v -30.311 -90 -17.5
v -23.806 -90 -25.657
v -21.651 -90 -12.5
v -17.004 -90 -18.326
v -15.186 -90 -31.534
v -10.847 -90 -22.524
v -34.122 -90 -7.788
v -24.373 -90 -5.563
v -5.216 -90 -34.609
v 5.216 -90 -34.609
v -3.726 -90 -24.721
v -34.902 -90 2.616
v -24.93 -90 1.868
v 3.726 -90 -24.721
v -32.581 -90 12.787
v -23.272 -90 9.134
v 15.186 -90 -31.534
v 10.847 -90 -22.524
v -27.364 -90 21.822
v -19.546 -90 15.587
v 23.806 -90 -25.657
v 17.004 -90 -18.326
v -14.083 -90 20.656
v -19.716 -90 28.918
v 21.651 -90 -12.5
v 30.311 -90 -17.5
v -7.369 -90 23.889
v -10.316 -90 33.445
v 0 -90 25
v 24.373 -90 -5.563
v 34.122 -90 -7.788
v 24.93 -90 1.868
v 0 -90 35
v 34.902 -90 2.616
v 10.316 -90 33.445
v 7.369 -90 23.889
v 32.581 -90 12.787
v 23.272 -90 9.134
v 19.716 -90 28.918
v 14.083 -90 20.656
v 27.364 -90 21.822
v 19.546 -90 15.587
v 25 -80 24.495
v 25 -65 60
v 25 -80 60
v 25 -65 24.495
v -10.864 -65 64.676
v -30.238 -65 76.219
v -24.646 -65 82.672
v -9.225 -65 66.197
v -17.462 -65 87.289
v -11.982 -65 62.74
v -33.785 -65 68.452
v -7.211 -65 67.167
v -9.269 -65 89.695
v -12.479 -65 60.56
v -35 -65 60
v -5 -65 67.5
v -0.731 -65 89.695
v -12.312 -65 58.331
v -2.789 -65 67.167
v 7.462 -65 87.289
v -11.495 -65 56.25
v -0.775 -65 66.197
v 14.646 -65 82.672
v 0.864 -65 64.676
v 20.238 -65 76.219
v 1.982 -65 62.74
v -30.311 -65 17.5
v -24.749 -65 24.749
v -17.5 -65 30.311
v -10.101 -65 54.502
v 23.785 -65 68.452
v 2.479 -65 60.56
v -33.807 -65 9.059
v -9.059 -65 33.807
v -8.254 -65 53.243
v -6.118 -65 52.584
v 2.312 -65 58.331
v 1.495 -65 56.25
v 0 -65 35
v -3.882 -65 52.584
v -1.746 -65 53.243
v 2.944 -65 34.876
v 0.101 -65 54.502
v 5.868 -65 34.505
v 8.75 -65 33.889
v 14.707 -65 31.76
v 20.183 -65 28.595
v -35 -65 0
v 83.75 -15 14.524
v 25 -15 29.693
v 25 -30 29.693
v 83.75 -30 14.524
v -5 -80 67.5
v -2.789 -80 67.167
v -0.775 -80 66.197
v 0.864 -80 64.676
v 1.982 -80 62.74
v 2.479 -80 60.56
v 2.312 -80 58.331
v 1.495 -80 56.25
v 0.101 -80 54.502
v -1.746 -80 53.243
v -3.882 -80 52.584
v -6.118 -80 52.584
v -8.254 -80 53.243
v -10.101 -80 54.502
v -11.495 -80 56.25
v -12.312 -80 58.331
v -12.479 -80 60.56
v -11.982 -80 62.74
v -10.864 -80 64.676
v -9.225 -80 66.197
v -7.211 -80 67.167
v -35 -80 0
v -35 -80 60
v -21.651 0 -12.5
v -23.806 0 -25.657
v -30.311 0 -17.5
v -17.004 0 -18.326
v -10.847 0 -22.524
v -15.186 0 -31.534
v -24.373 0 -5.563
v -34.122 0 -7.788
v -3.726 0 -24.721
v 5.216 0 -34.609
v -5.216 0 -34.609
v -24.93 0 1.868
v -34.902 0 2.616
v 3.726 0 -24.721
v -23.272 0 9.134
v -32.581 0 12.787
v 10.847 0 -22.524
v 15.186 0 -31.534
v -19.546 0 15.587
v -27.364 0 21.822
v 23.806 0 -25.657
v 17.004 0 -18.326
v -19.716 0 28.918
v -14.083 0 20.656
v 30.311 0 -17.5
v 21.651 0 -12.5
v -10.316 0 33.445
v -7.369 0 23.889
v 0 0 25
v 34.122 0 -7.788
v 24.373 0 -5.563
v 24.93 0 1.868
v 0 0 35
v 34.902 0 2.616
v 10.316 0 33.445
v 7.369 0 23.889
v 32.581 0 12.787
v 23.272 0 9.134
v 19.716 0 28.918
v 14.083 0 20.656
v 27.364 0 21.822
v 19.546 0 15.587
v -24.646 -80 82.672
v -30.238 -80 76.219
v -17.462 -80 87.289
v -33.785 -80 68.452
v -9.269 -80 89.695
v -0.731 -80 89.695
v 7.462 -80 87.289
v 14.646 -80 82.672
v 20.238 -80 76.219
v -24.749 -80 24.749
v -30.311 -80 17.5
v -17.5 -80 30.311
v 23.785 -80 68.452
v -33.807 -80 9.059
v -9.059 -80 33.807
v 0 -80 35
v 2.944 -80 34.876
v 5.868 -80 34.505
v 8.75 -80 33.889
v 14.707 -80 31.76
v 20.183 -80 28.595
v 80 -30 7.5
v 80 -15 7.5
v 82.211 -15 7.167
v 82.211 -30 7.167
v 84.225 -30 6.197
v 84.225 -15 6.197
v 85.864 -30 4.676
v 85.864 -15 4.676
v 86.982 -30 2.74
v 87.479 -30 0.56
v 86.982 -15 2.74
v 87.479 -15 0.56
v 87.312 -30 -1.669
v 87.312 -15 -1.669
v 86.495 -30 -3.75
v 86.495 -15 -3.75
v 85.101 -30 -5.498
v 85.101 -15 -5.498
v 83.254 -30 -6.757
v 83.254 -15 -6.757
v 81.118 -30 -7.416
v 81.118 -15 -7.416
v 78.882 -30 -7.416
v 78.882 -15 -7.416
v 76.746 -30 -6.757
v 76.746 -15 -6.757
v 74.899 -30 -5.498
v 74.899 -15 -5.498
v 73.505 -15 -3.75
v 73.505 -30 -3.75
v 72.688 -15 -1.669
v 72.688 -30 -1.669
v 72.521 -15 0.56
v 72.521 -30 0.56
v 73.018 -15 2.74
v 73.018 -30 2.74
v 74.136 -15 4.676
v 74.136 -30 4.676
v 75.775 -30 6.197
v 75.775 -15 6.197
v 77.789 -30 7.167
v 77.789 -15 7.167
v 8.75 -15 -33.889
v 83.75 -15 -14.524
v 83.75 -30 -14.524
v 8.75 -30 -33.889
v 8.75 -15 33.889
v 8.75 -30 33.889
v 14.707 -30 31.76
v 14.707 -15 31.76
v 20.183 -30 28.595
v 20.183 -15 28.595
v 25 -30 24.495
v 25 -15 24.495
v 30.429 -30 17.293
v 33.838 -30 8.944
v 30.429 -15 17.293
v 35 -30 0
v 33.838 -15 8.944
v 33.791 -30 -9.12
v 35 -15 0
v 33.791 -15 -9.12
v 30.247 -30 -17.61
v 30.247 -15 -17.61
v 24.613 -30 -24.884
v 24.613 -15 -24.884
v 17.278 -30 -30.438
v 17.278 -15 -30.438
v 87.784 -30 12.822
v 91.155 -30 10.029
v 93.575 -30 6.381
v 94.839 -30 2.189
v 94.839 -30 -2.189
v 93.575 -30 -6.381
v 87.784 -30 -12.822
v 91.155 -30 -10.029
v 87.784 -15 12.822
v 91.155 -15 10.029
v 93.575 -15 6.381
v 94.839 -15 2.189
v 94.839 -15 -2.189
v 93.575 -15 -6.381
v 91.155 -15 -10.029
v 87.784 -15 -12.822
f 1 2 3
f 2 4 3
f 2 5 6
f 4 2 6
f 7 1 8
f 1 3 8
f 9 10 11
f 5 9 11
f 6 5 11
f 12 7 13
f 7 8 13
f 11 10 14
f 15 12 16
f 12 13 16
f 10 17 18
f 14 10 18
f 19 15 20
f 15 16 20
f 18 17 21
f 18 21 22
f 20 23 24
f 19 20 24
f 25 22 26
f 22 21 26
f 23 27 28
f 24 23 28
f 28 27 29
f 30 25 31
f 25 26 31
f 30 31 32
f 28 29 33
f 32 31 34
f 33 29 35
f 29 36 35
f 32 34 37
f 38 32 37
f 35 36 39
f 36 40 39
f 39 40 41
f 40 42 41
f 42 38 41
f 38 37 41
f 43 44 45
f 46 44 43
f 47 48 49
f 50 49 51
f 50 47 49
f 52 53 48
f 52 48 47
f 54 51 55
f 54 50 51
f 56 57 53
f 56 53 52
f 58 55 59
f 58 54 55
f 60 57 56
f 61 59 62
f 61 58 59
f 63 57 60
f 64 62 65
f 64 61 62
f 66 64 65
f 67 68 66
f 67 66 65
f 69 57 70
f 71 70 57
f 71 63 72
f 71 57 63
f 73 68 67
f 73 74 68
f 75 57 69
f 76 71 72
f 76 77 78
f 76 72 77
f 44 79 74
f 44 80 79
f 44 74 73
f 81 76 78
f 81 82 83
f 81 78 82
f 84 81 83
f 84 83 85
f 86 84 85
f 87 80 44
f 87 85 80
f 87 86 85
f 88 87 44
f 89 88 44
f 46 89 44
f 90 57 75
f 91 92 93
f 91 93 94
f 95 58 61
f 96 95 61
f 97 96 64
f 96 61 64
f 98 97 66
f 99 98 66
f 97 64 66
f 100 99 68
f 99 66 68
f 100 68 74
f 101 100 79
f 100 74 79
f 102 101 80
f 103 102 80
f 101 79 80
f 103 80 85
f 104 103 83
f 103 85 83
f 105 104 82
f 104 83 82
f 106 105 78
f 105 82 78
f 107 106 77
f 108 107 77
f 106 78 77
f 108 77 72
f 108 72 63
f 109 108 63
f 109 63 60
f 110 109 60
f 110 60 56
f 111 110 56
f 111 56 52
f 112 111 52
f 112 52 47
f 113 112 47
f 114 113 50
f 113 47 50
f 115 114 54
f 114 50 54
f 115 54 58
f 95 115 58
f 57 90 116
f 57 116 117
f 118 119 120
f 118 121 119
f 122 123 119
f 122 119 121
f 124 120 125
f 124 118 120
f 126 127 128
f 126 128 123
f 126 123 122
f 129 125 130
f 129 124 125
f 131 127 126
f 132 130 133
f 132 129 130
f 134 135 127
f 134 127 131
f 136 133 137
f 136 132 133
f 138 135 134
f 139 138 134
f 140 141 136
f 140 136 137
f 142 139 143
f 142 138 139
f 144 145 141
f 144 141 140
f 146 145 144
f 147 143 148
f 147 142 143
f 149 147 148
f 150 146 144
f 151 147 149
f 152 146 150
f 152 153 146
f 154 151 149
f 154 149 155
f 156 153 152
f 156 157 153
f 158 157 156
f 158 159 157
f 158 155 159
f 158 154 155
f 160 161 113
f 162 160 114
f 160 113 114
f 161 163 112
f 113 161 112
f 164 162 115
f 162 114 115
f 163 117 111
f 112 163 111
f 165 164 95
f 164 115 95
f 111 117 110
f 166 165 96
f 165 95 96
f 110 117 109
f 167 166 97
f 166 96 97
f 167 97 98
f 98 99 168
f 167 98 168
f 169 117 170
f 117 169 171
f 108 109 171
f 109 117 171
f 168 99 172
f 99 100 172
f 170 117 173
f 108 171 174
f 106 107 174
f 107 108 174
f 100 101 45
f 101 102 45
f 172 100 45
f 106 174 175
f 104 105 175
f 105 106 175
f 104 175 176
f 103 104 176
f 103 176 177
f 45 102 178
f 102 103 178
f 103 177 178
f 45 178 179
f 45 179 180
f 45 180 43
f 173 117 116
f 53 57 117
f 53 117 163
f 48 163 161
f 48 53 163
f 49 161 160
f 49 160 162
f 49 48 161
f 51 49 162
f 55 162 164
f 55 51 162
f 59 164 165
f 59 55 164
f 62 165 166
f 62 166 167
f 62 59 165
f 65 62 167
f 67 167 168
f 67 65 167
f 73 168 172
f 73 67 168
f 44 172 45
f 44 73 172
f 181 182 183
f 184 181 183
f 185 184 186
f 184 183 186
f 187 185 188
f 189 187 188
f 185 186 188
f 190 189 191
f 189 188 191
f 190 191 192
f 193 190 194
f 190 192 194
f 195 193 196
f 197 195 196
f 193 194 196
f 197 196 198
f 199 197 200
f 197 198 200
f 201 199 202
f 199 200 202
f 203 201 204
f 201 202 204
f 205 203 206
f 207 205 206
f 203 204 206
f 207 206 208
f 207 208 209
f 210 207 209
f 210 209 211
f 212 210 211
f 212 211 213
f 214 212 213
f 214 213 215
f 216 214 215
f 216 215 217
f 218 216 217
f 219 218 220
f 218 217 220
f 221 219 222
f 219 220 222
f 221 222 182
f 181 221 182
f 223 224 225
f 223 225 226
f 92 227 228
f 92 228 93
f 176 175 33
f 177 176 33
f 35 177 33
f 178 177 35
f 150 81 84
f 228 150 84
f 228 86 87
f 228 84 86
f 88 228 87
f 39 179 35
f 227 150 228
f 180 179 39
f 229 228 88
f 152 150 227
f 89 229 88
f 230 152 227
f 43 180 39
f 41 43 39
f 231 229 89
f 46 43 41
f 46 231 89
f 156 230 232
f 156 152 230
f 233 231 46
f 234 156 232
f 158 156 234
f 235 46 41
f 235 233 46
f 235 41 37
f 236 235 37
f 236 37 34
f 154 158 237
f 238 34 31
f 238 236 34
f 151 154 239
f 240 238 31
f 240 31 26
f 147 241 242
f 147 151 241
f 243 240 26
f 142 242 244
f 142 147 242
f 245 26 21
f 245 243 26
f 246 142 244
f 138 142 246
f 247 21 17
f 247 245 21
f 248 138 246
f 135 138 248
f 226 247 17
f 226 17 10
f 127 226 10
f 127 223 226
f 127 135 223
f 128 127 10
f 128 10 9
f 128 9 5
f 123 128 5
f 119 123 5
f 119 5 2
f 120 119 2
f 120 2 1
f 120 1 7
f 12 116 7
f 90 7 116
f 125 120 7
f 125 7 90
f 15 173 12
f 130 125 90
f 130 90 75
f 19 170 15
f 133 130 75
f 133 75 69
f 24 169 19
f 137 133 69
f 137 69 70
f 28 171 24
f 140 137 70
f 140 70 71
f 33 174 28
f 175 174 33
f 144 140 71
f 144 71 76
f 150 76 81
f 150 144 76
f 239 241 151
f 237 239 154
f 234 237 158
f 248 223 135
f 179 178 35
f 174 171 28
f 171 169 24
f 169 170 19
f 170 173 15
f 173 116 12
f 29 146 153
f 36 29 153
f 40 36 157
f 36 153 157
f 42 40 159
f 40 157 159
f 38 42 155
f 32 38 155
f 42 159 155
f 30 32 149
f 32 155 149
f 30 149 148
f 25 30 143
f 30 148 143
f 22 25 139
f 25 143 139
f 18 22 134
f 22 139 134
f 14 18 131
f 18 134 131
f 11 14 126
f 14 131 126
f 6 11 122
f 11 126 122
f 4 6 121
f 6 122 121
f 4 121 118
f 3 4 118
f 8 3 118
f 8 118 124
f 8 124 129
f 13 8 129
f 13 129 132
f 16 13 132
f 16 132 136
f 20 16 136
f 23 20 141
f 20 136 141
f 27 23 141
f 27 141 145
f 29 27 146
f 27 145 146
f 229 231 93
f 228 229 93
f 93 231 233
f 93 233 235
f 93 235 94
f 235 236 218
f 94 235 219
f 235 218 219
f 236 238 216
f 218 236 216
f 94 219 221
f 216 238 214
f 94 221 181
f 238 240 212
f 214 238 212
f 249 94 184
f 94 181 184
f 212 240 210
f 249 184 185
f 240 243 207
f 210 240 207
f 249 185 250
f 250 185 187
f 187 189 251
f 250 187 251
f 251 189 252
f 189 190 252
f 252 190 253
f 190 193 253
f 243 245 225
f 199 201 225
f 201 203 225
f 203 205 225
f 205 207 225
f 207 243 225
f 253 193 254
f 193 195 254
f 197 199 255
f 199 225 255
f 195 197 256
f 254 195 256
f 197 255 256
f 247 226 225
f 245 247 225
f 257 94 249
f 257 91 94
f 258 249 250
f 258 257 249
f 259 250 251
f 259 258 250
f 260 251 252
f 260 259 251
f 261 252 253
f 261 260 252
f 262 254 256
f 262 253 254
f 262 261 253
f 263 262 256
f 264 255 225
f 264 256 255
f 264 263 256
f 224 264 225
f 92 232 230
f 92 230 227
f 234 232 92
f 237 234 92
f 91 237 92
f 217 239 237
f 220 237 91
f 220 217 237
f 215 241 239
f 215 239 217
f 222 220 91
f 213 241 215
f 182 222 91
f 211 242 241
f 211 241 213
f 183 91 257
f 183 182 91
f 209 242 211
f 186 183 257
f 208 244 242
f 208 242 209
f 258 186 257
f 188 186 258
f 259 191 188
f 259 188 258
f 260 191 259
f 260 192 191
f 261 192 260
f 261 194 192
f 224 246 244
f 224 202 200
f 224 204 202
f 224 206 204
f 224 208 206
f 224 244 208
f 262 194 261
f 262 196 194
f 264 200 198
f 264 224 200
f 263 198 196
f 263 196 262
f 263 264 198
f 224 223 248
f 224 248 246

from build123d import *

# Parameters (mm, degrees)
SKETCH1_R           = 25
BOSS_EXTRUDE1_DEPTH = 90
BOSS_EXTRUDE2_START = -65
SKETCH1_3_R         = 7.5
BOSS_EXTRUDE2_DEPTH = 15
BOSS_EXTRUDE3_START = -15
SKETCH1_4_R         = 7.5
BOSS_EXTRUDE3_DEPTH = 15


with BuildPart() as part:
    # Sketch1 → Boss-Extrude1 (new body)
    with BuildSketch(Plane(origin=(0, 0, 0), x_dir=(1, 0, 0), z_dir=(0, 1, 0))):
        with BuildLine():
            ThreePointArc((35, 0), (27.669929526, 21.433035249), (8.75, 33.888604279))
            ThreePointArc((8.75, 33.888604279), (-21.433035249, 27.669929526), (-35, 0))
            ThreePointArc((-35, 0), (-21.433035249, -27.669929526), (8.75, -33.888604279))
            ThreePointArc((8.75, -33.888604279), (17.516451042, -30.301385165), (25, -24.494897428))
            ThreePointArc((25, -24.494897428), (32.403703492, -13.228756555), (35, 0))
        make_face()
        Circle(SKETCH1_R, mode=Mode.SUBTRACT)
    extrude(amount=-BOSS_EXTRUDE1_DEPTH)

    # Sketch1<3> → Boss-Extrude2 (add)
    with BuildSketch(Plane(origin=(0, 0, 0), x_dir=(1, 0, 0), z_dir=(0, 1, 0)).offset(BOSS_EXTRUDE2_START)):
        with BuildLine():
            Line((-35, 0), (-35, -60))
            ThreePointArc((-35, -60), (-5, -90), (25, -60))
            Line((25, -60), (25, -24.494897428))
            ThreePointArc((25, -24.494897428), (-13.228756555, -32.403703492), (-35, 0))
        make_face()
        with Locations((-5, -60)):
            Circle(SKETCH1_3_R, mode=Mode.SUBTRACT)
    extrude(amount=-BOSS_EXTRUDE2_DEPTH)

    # Sketch1<4> → Boss-Extrude3 (add)
    with BuildSketch(Plane(origin=(0, 0, 0), x_dir=(1, 0, 0), z_dir=(0, 1, 0)).offset(BOSS_EXTRUDE3_START)):
        with BuildLine():
            Line((83.75, 14.523687548), (8.75, 33.888604279))
            ThreePointArc((8.75, 33.888604279), (35, 0), (8.75, -33.888604279))
            Line((8.75, -33.888604279), (83.75, -14.523687548))
            ThreePointArc((83.75, -14.523687548), (95, 0), (83.75, 14.523687548))
        make_face()
        with Locations((80, 0)):
            Circle(SKETCH1_4_R, mode=Mode.SUBTRACT)
    extrude(amount=-BOSS_EXTRUDE3_DEPTH)


solid = part.part
